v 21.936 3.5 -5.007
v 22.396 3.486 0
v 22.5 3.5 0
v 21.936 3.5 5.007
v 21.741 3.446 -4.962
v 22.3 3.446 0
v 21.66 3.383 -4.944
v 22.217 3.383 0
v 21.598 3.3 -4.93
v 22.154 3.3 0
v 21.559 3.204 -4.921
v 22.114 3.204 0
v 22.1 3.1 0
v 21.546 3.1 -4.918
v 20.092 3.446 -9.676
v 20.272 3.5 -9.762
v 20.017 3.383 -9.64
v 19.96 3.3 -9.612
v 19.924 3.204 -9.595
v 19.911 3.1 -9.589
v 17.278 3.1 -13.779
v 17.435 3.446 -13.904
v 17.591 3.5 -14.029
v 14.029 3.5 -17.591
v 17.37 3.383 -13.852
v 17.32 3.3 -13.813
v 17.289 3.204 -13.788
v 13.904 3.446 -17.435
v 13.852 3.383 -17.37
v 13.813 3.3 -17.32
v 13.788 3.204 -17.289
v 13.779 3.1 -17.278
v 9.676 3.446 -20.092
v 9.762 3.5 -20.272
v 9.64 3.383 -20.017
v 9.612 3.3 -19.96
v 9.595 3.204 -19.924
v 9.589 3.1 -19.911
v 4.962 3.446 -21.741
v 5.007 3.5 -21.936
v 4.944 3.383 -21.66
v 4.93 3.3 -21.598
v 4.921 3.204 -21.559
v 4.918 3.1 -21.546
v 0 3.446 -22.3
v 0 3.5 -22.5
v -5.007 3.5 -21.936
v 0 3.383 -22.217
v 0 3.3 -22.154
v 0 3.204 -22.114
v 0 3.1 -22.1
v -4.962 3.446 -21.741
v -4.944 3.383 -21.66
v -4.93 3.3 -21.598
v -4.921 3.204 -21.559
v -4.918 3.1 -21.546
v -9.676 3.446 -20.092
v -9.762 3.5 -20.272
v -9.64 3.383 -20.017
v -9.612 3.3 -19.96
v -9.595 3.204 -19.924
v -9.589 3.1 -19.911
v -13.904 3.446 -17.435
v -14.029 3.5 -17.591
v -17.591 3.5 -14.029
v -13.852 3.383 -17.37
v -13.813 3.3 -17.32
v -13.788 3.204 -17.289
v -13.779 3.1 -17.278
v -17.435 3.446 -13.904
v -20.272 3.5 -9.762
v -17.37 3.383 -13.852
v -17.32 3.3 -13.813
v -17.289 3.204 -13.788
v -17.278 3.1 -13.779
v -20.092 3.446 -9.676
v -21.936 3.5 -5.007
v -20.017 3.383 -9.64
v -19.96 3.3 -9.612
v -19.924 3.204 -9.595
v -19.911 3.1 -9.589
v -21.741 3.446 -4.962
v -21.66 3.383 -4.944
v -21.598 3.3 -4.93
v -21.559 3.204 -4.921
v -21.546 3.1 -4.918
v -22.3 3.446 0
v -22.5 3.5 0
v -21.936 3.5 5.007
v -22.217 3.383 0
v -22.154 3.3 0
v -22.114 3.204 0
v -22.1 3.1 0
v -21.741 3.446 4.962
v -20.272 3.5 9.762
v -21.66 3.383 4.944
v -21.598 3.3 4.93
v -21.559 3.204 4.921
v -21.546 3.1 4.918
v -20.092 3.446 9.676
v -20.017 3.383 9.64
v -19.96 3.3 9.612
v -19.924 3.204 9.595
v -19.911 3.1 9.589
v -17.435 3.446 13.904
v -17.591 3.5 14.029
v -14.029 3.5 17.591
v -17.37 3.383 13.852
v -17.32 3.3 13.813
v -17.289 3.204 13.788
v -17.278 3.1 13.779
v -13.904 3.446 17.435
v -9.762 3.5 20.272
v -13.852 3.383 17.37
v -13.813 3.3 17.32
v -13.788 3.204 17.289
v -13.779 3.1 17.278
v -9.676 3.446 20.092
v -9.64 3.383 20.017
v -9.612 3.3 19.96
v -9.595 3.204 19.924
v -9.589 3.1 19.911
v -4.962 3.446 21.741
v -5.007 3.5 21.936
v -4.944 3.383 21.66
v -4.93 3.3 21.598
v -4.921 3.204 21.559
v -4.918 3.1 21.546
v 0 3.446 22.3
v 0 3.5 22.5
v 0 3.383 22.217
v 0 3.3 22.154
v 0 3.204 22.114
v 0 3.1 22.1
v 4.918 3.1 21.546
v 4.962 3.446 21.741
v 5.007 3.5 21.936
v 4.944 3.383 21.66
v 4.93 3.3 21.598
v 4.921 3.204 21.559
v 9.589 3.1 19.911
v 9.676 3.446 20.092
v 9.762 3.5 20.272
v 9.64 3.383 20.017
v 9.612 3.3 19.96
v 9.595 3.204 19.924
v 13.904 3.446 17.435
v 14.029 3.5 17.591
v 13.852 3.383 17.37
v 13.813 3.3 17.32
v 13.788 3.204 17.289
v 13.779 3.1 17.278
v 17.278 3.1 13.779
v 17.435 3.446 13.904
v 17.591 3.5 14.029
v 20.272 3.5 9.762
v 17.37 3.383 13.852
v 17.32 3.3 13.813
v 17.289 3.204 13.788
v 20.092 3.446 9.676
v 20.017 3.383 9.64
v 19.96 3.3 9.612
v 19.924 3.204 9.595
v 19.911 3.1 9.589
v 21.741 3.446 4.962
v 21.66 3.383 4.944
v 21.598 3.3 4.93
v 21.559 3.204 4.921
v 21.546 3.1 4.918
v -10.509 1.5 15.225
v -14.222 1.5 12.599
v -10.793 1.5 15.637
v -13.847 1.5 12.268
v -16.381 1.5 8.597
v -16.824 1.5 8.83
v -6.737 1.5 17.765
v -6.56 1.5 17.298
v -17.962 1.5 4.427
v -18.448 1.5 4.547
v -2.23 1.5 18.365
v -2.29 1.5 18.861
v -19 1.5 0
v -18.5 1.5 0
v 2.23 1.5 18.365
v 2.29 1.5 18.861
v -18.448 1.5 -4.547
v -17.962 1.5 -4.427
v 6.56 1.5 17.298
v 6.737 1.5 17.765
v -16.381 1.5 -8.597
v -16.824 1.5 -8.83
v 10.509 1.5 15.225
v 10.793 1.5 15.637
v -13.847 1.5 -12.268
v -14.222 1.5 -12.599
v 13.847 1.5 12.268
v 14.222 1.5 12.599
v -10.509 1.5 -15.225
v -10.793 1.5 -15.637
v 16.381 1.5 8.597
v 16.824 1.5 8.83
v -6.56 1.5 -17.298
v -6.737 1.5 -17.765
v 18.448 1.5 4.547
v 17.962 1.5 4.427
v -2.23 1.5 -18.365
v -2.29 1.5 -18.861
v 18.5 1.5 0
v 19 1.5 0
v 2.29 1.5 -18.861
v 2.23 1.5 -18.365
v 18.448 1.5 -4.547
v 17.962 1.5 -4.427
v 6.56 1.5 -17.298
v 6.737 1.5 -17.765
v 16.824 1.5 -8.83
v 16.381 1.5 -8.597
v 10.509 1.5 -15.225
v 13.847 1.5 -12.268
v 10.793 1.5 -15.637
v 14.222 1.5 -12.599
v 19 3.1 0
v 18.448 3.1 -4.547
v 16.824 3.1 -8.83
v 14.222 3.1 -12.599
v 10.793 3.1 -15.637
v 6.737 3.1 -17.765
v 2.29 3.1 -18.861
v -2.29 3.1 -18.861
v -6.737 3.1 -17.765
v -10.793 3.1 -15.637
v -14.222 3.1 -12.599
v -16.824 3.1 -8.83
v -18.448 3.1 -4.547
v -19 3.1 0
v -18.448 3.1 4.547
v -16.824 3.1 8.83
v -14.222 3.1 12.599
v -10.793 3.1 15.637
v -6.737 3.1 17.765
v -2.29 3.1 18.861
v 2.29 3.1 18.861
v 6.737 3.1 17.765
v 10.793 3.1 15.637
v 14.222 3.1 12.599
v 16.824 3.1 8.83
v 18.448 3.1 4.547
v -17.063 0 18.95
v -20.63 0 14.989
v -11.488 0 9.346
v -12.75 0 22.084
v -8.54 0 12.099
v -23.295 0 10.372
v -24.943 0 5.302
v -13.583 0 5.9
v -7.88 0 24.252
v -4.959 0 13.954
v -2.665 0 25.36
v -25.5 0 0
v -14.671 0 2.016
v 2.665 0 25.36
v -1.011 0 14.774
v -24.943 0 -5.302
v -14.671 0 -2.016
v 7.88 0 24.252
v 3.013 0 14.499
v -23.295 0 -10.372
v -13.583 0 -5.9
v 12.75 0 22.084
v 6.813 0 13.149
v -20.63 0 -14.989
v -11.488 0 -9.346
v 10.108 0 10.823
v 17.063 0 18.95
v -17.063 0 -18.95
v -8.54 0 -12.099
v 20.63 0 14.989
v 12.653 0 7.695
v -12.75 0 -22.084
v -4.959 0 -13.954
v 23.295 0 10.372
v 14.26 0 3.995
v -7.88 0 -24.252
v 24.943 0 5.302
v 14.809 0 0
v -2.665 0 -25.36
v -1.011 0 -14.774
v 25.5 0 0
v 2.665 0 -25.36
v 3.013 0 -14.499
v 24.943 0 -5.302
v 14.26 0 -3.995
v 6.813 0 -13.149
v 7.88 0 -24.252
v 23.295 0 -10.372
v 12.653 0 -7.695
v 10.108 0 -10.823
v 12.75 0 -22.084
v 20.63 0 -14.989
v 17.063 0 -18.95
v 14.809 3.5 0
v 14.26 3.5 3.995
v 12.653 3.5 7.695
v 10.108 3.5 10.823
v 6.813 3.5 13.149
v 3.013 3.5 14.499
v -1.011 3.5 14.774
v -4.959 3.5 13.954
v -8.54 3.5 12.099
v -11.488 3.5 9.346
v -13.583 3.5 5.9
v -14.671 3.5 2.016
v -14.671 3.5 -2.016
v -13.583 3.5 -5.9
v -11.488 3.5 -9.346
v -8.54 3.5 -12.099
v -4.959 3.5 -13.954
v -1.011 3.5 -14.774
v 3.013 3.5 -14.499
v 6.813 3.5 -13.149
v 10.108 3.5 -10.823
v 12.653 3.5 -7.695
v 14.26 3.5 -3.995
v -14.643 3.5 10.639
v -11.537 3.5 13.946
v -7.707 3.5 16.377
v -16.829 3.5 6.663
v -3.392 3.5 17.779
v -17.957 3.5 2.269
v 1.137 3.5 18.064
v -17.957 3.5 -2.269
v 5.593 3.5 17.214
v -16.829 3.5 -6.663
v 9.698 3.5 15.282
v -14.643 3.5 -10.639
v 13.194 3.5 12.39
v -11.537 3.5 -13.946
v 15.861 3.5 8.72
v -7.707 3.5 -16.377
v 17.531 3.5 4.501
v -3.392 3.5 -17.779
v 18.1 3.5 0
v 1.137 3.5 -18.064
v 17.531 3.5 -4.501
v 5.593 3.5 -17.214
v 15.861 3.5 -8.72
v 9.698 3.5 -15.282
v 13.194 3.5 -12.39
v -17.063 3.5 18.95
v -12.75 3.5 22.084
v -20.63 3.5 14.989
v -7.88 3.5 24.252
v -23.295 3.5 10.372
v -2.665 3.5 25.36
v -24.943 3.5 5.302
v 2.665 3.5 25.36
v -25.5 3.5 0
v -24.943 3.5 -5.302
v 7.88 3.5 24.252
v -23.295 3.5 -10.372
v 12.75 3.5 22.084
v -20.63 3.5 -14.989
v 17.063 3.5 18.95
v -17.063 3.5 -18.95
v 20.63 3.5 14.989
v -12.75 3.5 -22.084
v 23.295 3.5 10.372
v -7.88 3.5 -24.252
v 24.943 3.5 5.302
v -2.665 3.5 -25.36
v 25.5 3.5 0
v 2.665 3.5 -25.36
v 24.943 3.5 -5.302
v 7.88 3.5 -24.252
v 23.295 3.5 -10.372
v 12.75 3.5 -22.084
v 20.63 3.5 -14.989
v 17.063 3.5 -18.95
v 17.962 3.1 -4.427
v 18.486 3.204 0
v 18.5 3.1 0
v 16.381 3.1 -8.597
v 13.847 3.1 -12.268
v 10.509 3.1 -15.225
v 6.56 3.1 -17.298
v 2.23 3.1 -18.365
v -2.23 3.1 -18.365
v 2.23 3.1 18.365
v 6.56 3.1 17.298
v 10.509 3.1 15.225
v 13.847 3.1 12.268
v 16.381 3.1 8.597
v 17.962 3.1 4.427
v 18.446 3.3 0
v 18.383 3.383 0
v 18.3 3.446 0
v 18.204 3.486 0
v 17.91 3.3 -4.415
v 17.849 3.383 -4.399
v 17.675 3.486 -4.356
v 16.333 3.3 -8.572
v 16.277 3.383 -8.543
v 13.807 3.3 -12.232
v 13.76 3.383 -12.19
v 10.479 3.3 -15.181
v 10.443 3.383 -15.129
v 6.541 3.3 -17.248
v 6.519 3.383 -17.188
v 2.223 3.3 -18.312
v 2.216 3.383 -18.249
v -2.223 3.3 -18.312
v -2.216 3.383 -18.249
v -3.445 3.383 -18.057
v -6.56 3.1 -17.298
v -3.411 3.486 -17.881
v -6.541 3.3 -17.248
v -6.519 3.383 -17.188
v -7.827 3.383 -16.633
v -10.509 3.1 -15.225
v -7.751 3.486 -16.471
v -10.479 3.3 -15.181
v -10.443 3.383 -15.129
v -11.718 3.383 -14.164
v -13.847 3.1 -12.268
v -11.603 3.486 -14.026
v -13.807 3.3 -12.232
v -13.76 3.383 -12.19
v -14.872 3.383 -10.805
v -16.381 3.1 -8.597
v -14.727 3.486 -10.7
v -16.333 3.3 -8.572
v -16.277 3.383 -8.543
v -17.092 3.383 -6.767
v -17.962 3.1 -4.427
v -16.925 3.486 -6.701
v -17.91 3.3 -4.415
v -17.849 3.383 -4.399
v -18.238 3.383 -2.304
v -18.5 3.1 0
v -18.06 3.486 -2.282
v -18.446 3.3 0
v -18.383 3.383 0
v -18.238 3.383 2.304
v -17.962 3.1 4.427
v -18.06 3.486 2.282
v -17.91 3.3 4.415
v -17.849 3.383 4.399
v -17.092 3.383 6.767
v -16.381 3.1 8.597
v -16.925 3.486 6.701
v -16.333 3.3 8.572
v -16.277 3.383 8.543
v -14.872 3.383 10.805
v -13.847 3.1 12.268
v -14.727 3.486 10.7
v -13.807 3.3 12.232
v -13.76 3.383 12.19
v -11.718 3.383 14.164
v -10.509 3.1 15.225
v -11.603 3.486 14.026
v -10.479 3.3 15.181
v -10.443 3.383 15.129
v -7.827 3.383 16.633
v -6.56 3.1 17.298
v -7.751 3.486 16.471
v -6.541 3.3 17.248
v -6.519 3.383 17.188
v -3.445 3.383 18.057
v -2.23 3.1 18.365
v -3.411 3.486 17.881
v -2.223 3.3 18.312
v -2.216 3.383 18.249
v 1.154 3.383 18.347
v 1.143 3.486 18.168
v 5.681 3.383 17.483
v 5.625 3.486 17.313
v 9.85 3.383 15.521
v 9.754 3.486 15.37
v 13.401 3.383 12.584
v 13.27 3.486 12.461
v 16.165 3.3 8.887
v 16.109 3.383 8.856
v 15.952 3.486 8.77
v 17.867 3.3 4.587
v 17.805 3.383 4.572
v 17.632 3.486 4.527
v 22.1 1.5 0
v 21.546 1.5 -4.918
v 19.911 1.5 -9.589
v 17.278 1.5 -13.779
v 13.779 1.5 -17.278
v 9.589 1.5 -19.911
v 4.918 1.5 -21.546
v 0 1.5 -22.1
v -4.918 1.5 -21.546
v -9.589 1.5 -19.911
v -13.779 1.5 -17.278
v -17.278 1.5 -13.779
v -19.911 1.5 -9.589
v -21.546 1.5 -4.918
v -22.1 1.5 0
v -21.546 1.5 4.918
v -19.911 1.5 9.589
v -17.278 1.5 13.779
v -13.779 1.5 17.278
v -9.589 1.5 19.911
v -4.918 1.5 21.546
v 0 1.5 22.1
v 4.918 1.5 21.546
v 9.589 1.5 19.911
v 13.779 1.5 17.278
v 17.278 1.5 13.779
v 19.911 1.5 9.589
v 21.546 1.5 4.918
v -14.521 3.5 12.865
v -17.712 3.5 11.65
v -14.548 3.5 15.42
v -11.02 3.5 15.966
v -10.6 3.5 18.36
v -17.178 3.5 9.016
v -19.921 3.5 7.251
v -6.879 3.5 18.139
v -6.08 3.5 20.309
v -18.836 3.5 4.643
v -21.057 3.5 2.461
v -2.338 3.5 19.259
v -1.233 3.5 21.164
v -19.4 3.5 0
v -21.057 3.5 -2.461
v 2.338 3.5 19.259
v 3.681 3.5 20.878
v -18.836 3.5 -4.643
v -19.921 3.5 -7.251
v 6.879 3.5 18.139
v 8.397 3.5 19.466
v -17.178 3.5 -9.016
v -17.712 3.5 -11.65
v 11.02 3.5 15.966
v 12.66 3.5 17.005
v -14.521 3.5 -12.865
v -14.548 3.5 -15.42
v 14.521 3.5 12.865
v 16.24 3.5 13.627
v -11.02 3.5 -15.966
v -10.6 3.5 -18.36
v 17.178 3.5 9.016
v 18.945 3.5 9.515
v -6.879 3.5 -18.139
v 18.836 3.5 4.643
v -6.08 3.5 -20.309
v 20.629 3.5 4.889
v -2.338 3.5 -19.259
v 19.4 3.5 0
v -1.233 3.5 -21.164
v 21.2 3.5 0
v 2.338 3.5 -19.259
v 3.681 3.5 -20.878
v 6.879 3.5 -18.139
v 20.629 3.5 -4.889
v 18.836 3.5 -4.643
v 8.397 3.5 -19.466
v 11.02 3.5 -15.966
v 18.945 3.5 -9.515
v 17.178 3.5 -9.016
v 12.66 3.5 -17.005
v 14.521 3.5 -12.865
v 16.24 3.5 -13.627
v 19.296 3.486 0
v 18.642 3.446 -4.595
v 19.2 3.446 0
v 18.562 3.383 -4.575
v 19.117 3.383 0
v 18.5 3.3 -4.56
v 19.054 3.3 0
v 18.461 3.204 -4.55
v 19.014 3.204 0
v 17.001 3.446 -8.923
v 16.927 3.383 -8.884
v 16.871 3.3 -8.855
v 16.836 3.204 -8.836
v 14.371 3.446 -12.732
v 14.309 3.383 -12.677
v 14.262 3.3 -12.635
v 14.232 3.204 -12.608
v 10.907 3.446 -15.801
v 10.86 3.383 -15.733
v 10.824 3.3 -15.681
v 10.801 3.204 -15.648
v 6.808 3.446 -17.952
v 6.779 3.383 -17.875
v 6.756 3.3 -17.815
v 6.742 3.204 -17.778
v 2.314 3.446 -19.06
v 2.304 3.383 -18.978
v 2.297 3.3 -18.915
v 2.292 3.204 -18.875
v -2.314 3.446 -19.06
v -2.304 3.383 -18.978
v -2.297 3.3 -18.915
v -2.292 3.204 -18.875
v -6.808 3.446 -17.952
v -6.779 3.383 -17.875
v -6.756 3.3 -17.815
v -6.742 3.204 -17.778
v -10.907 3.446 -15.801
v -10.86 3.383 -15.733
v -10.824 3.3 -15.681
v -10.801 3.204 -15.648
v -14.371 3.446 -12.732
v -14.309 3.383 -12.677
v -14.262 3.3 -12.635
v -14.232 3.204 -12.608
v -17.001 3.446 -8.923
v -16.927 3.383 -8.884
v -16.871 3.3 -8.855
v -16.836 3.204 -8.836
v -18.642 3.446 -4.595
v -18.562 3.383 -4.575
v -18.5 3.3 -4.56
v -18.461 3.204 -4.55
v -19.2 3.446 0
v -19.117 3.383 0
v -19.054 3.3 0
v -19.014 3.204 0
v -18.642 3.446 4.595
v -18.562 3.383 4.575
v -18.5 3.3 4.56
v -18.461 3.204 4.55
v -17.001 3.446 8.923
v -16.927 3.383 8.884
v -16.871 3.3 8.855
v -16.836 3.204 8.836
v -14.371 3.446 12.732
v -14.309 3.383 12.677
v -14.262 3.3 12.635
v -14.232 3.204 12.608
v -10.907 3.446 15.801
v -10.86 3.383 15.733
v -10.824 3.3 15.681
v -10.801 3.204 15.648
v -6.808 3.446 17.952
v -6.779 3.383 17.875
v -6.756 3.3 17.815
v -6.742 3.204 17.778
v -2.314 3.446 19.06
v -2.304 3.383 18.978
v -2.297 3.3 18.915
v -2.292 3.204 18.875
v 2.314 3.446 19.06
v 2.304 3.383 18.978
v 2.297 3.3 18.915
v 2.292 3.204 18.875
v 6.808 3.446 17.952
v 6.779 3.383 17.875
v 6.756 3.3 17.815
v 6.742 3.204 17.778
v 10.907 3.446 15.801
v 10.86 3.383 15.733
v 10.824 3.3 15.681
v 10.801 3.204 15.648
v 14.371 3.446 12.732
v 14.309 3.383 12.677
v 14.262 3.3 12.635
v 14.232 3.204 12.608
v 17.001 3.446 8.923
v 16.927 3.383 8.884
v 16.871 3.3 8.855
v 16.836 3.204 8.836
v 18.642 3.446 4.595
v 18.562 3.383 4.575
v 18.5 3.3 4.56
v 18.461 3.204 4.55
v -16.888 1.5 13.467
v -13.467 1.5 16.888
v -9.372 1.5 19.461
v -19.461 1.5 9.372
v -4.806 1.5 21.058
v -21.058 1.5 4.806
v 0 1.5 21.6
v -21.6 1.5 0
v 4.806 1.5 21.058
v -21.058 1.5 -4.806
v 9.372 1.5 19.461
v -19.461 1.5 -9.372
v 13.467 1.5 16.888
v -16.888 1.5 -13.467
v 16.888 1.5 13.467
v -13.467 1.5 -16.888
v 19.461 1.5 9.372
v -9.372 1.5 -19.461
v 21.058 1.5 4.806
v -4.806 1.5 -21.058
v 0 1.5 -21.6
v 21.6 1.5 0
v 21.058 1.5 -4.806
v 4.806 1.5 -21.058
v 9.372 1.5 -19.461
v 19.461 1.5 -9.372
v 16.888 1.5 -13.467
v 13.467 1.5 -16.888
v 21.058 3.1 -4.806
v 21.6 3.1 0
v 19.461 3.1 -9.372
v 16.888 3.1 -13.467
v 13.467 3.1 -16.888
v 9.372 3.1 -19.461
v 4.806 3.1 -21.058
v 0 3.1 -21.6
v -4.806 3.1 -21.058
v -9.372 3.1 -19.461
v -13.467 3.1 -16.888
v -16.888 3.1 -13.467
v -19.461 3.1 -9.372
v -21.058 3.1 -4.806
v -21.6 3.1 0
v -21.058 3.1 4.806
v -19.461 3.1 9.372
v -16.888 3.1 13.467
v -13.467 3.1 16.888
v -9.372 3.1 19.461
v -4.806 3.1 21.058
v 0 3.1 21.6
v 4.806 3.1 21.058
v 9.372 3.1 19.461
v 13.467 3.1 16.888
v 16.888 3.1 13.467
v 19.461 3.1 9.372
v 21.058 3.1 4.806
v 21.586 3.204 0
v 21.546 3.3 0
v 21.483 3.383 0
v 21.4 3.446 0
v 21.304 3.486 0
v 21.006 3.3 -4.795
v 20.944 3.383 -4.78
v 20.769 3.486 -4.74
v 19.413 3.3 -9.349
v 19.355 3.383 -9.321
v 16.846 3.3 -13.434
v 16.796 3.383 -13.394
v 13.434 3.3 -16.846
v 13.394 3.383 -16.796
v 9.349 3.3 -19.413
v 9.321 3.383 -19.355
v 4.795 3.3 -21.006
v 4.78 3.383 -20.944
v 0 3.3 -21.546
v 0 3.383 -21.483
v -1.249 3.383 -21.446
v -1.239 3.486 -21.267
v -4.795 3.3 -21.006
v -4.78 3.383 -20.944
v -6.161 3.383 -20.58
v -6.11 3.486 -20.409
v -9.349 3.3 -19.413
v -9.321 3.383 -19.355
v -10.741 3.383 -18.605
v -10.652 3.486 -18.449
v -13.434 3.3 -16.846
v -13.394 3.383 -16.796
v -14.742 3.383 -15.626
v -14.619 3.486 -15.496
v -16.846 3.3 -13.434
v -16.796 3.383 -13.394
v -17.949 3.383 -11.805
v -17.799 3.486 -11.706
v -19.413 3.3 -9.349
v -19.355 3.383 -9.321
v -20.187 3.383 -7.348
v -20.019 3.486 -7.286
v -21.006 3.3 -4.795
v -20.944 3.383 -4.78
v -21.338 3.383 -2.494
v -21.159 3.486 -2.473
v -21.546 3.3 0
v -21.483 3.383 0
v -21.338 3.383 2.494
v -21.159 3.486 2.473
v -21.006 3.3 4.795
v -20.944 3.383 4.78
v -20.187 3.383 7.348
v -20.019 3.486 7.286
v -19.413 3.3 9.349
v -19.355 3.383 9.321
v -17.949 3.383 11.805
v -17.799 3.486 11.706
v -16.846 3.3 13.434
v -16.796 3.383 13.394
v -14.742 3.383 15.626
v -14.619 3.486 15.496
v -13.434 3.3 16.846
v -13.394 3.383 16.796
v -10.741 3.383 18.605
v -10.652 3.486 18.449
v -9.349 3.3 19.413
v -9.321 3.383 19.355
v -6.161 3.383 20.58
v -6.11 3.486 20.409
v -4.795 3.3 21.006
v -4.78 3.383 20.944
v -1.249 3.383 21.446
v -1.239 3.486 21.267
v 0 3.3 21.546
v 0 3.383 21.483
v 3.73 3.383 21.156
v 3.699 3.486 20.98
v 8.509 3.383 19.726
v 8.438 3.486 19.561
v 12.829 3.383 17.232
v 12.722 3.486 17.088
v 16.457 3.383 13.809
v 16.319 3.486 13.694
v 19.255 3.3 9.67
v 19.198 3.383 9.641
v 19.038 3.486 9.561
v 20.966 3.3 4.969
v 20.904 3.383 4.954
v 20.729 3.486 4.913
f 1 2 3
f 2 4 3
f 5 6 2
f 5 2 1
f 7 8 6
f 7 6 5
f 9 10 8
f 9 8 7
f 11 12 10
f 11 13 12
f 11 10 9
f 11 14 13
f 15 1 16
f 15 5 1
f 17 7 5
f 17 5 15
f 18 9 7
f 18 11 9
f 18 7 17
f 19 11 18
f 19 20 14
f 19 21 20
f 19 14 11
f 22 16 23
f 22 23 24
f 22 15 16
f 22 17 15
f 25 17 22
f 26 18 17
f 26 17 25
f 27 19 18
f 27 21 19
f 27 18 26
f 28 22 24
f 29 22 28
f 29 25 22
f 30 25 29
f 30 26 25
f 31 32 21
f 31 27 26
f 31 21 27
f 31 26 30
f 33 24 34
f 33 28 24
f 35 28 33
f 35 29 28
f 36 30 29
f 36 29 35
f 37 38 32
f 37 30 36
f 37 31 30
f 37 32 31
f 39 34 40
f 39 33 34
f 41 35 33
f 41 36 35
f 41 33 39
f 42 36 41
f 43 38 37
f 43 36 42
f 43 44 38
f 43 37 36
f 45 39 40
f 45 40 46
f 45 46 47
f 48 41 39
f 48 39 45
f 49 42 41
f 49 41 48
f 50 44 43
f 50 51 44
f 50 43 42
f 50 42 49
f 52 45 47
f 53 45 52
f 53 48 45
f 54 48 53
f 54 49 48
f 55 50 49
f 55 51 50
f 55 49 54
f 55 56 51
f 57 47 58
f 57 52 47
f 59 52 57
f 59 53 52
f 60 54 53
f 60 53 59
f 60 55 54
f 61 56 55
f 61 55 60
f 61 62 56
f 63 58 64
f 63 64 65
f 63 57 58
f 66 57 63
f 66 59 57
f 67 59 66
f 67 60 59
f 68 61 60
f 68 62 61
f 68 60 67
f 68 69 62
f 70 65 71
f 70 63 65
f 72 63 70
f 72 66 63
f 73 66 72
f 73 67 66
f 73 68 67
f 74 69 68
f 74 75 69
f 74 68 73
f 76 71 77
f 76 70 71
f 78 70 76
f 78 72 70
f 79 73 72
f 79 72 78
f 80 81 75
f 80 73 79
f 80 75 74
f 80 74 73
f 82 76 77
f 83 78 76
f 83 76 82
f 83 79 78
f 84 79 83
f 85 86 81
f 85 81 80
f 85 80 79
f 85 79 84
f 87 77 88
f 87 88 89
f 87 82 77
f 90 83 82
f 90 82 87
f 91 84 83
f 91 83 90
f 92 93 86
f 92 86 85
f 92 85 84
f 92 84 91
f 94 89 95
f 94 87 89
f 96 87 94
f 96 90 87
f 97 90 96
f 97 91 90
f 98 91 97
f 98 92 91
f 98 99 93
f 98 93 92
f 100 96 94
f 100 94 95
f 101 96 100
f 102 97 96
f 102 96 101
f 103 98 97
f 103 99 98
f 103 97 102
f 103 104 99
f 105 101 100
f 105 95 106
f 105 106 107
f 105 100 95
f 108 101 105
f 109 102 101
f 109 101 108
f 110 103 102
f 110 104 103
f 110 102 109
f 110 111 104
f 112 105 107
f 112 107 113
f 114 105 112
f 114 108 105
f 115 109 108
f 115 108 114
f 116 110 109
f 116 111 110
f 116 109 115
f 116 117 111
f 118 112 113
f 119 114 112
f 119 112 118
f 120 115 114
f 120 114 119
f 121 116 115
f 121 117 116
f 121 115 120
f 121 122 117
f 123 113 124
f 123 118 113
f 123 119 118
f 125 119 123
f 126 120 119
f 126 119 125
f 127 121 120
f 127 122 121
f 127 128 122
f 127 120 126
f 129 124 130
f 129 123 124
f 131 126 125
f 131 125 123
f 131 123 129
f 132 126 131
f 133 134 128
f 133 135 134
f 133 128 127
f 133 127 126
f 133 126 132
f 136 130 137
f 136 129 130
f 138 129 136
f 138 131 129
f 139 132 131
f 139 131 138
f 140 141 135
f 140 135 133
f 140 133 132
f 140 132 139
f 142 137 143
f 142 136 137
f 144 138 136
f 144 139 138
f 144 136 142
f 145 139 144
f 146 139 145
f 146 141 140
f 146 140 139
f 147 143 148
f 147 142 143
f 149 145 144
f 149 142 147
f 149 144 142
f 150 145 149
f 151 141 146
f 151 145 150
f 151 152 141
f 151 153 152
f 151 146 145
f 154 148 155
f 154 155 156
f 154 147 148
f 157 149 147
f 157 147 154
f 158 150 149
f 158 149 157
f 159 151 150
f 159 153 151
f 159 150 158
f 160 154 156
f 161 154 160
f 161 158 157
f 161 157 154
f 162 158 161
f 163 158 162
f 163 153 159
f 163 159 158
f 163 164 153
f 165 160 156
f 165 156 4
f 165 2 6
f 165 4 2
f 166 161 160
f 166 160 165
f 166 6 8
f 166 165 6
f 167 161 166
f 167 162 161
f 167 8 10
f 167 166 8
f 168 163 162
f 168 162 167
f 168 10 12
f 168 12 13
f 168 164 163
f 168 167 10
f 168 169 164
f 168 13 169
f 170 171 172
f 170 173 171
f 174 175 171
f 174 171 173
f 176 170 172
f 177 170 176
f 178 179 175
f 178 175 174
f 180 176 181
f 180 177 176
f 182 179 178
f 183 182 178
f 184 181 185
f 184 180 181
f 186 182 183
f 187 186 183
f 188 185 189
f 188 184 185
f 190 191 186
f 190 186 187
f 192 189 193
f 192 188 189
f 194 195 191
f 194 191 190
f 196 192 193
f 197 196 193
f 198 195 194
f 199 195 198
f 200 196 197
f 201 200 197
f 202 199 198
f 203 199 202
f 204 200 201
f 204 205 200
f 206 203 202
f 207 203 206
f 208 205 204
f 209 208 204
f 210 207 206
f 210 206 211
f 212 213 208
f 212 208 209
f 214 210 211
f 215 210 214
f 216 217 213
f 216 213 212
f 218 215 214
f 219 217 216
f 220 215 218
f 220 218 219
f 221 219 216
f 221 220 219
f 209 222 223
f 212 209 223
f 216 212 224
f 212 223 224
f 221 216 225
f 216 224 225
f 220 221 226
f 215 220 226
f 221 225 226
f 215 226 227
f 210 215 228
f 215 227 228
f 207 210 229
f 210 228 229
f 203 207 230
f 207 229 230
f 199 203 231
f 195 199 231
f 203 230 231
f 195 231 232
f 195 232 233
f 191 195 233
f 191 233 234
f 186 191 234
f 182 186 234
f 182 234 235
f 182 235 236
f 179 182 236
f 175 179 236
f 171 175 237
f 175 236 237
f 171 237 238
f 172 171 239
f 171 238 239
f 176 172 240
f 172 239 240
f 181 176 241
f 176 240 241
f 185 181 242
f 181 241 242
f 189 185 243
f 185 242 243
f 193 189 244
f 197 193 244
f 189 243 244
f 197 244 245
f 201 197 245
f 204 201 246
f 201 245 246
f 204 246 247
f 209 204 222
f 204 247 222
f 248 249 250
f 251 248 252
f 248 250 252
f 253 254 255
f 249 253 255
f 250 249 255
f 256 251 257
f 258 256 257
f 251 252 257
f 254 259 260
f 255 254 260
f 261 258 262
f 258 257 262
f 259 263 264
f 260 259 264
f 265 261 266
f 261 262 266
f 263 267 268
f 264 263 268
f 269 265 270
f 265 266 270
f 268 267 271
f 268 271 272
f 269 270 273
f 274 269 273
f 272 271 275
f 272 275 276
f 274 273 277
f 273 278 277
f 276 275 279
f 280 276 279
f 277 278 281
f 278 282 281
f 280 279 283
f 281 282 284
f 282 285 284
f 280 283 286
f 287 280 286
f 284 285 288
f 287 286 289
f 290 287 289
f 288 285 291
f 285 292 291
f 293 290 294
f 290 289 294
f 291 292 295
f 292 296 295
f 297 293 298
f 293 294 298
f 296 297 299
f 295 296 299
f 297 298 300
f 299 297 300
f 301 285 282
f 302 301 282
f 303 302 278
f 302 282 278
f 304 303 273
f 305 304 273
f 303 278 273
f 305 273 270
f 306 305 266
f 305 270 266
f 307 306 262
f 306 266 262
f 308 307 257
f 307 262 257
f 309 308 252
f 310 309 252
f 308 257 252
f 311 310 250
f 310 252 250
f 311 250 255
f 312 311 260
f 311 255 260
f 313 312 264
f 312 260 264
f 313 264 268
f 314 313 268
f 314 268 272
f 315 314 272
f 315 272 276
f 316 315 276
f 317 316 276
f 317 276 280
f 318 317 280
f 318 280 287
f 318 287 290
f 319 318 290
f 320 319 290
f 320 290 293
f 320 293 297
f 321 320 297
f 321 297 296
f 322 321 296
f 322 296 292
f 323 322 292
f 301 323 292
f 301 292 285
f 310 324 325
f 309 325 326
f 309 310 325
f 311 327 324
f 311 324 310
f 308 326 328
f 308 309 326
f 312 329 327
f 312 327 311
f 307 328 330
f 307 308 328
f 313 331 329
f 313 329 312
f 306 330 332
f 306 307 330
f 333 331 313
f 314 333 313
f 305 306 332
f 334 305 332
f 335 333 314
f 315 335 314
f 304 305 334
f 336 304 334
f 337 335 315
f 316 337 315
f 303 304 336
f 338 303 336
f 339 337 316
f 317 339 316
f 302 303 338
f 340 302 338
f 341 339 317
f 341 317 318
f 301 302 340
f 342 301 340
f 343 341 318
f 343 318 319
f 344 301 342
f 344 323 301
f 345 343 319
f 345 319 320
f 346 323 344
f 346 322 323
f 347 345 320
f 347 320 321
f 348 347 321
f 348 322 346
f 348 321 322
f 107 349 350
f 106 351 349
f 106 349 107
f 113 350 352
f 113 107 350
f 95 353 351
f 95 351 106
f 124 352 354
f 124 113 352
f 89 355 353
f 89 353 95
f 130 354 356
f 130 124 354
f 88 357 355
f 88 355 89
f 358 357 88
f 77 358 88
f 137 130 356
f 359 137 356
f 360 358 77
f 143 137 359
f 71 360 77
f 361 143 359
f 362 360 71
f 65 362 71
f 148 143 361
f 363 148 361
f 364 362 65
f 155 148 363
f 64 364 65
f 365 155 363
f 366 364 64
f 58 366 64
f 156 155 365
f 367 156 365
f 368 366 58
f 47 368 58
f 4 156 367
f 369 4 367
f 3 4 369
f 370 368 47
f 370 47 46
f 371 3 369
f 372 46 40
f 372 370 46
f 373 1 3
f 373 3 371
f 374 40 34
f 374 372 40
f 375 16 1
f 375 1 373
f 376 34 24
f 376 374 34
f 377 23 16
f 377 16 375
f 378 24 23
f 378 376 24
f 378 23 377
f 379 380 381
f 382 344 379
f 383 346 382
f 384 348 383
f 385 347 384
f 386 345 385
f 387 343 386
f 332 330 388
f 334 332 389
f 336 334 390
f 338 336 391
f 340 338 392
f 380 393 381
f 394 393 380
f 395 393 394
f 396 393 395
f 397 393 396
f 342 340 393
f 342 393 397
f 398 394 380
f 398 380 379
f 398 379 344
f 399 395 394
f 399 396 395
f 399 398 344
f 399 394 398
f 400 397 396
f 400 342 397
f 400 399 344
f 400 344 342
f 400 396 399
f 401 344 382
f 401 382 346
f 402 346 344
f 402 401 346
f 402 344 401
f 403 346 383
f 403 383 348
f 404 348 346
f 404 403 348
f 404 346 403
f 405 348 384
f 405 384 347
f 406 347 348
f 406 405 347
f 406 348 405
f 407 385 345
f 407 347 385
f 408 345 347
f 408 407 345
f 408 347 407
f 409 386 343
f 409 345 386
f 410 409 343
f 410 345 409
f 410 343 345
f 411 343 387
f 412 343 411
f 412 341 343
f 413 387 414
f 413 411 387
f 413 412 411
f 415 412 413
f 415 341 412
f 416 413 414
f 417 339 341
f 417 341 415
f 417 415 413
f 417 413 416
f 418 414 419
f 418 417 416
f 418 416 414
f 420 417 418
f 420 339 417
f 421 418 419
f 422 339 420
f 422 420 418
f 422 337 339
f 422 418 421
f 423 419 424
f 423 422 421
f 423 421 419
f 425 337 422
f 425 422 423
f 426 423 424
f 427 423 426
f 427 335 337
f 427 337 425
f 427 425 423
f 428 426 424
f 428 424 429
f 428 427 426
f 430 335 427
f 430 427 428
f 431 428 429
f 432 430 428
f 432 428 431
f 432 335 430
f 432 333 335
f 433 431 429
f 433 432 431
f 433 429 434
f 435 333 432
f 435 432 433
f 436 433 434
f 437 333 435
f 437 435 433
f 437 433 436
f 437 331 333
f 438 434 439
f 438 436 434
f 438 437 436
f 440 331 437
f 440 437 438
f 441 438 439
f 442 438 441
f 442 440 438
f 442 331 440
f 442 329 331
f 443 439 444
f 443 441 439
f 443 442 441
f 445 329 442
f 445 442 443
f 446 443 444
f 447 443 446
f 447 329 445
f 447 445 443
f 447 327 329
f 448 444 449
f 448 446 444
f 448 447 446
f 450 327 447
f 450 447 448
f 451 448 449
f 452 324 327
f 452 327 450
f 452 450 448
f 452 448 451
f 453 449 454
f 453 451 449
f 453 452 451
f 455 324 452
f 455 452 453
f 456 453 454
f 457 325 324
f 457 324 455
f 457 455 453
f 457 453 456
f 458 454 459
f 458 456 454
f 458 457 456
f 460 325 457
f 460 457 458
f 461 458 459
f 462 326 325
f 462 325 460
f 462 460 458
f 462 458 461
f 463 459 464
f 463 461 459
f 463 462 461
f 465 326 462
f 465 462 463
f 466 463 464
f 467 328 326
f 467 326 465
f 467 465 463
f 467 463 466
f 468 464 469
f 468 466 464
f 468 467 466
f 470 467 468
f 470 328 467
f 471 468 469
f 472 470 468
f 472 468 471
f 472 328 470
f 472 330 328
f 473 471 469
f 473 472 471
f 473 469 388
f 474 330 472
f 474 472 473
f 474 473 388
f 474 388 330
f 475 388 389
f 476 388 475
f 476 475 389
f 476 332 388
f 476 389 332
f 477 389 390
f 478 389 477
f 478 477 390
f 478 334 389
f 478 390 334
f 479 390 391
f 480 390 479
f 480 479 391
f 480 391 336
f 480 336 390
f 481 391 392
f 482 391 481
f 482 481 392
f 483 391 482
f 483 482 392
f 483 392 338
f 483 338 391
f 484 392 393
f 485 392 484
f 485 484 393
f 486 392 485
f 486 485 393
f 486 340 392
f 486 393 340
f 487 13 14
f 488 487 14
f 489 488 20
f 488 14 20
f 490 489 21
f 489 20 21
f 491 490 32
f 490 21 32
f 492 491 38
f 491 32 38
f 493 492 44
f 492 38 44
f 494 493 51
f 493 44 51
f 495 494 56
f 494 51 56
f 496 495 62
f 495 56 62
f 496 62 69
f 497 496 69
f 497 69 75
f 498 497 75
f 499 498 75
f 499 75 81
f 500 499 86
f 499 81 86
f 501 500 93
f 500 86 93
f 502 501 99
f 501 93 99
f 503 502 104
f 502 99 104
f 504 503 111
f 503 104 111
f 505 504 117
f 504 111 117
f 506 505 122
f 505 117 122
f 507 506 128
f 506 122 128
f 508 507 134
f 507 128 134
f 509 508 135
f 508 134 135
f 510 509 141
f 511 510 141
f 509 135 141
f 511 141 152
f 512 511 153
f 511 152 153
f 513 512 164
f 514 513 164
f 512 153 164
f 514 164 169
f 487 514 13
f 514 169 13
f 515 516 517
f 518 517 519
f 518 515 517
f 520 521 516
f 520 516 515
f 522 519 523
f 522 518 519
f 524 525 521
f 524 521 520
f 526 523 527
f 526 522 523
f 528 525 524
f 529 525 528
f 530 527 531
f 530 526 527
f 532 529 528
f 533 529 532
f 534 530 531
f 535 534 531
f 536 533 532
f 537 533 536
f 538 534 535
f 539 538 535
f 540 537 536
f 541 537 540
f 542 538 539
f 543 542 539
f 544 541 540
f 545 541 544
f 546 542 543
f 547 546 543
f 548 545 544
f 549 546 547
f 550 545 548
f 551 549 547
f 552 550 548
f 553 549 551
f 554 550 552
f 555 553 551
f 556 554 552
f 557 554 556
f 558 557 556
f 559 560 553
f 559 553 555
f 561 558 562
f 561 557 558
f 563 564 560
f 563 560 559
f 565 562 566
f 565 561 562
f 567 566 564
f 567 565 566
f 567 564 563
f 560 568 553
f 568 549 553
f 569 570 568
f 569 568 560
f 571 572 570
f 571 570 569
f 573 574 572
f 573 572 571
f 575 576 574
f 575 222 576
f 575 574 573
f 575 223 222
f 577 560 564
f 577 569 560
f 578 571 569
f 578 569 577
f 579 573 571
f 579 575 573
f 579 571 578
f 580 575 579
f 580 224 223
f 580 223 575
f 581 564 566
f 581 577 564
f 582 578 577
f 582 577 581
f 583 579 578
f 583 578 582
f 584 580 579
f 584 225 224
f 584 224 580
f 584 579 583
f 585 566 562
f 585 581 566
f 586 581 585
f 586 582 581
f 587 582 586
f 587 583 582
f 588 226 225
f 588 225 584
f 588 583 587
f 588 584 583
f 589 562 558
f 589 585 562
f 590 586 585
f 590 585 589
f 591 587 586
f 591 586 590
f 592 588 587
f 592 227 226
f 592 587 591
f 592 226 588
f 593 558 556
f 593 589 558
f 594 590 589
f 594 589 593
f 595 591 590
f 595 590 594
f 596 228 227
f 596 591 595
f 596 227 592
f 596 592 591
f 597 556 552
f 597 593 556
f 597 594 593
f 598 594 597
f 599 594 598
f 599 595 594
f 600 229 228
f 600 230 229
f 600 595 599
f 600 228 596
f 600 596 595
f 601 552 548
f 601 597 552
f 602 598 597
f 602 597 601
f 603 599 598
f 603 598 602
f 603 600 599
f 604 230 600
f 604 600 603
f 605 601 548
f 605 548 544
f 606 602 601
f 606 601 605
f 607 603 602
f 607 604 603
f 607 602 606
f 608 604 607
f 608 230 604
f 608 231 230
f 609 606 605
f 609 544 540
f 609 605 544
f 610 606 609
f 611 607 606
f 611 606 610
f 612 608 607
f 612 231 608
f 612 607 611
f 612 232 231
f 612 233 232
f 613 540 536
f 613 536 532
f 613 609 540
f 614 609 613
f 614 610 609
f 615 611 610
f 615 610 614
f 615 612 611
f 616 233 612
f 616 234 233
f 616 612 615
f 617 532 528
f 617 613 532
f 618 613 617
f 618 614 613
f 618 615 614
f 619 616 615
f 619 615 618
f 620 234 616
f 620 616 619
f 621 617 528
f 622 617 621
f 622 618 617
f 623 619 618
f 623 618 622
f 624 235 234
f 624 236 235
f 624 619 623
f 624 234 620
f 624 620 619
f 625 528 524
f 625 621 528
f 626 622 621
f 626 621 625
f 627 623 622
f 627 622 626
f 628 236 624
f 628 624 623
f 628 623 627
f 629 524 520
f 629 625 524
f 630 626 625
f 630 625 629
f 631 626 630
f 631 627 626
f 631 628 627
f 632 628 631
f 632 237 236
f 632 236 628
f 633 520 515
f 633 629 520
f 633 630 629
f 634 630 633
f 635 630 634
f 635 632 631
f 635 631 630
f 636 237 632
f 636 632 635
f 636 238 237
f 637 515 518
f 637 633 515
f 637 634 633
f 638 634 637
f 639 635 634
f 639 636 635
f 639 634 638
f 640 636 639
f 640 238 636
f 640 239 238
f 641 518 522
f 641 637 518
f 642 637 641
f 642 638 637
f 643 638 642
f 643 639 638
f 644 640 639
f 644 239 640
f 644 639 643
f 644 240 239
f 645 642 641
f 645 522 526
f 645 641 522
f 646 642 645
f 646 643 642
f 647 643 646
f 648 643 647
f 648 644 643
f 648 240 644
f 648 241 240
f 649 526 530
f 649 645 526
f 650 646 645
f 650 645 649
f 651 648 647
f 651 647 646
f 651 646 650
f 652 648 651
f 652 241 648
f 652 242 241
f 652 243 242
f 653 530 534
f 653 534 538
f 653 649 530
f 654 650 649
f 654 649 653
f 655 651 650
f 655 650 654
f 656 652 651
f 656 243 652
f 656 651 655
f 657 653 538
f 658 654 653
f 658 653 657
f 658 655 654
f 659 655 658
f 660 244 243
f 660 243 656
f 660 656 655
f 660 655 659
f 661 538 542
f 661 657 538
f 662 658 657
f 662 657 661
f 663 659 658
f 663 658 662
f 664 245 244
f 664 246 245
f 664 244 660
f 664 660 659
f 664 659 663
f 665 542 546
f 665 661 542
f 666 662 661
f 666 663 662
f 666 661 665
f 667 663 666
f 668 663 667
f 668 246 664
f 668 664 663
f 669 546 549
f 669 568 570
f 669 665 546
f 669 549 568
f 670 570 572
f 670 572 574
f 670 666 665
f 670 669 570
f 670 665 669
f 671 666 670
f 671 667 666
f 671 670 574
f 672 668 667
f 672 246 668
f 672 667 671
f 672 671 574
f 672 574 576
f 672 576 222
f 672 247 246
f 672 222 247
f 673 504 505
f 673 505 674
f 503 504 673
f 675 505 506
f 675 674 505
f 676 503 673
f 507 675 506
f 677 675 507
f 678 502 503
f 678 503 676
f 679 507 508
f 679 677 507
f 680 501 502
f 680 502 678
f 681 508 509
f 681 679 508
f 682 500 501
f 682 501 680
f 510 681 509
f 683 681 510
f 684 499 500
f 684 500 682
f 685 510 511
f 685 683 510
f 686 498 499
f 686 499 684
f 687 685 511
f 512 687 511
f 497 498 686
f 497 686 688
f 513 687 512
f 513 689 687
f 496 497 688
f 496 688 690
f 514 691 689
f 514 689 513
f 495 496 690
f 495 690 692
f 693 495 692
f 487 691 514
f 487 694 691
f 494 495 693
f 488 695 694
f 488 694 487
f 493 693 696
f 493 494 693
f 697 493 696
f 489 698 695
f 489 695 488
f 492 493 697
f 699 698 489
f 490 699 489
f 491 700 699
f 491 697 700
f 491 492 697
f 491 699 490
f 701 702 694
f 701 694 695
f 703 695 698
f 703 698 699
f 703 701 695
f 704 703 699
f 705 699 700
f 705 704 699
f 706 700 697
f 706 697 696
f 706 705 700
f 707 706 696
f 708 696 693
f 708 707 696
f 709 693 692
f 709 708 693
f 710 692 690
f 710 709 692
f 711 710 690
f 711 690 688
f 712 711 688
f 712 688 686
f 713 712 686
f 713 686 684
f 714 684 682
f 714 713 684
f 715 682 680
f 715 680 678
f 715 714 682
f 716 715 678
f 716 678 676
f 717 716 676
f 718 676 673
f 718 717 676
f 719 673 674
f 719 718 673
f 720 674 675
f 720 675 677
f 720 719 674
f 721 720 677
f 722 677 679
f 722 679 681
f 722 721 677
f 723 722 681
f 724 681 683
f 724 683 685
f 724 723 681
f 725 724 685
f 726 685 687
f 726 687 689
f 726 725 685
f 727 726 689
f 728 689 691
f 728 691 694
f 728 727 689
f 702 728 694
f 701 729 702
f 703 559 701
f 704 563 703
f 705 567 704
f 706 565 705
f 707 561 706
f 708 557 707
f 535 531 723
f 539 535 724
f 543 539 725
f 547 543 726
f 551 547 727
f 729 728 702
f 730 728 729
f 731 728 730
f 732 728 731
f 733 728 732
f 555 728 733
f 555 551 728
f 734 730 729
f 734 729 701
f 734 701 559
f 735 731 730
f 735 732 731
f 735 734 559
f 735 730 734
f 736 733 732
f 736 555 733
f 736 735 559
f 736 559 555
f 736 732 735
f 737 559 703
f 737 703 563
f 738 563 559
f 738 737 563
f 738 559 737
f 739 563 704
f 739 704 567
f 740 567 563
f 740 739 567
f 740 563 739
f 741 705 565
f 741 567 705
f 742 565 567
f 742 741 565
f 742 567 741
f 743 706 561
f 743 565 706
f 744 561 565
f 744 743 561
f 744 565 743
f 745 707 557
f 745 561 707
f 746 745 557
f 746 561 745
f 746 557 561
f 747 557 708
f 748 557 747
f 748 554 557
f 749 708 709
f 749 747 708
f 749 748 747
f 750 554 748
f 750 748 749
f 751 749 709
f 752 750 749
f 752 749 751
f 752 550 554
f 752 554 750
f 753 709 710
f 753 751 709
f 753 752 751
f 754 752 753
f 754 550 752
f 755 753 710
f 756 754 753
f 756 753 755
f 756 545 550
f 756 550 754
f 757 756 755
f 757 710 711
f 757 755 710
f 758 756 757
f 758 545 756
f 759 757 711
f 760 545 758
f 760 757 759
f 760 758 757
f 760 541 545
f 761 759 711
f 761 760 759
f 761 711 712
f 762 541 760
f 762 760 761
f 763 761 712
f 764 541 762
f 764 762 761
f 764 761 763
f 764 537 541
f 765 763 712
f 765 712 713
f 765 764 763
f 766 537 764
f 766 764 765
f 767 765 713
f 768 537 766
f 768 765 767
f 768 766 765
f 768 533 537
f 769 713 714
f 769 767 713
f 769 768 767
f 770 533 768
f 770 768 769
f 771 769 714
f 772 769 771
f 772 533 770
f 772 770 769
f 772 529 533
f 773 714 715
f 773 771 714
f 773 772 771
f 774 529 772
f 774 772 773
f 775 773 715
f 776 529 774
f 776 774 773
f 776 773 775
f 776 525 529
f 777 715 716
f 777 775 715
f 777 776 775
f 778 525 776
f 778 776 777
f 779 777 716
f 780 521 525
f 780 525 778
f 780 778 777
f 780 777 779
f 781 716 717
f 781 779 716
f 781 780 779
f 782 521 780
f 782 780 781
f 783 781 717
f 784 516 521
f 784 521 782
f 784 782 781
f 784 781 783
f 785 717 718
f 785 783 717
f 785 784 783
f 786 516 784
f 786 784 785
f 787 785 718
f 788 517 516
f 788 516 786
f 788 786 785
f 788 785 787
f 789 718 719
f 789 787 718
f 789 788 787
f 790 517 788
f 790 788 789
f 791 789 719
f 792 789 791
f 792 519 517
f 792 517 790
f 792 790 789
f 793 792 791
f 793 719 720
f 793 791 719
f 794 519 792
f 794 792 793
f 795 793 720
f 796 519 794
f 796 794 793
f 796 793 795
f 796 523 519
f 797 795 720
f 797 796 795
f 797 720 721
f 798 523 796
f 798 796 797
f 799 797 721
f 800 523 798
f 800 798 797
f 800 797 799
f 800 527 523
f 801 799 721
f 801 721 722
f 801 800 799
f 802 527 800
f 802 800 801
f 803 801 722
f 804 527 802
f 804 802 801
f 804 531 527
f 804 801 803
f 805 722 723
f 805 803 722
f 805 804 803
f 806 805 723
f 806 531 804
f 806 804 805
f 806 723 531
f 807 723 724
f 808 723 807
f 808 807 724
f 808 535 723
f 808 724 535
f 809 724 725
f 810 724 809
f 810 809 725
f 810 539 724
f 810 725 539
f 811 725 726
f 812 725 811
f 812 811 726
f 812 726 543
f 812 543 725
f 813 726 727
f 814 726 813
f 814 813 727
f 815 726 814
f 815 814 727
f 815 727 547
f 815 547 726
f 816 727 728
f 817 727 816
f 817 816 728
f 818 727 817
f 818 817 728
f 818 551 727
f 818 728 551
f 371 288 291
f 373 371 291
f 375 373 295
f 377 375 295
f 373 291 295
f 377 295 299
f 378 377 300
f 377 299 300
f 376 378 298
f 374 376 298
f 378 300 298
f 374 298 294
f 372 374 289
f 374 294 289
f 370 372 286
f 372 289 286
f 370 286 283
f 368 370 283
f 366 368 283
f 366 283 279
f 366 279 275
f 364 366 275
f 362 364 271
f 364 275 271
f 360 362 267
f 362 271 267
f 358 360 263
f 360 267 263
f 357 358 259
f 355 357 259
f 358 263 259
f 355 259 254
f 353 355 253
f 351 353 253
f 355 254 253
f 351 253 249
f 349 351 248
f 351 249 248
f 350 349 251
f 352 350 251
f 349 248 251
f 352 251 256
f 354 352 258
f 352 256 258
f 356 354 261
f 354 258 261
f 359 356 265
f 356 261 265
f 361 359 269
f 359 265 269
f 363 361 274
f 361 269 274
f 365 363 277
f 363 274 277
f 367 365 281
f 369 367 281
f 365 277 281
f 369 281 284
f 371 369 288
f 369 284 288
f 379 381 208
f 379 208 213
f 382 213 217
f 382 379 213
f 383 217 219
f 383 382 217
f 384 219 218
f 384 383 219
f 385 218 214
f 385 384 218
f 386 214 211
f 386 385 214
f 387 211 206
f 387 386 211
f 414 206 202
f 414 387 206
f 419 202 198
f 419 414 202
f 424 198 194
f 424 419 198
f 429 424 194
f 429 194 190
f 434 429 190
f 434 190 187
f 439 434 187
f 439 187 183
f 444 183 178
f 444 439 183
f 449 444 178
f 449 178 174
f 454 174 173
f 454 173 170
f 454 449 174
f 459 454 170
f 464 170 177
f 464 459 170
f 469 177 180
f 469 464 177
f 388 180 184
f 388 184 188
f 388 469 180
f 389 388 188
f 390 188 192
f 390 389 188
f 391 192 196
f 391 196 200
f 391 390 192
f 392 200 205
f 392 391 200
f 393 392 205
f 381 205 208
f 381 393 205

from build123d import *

# Parameters (mm, degrees)
SKETCH_1_R          = 25.5
EXTRUDE_1_DEPTH     = 3.5
SKETCH_2_R          = 19
SKETCH_2_R_2        = 18.5
CUT_EXTRUDE_1_DEPTH = 2
SKETCH_3_R          = 22.1
SKETCH_3_R_2        = 21.6
CUT_EXTRUDE_2_DEPTH = 2
FILLET_1_R          = 0.4
SKETCH_4_R          = 14.809002025
CUT_EXTRUDE_3_DEPTH = 10


with BuildPart() as part:
    # 草图1 → 凸台-拉伸1 (new body)
    with BuildSketch(Plane(origin=(0, 0, 0), x_dir=(1, 0, 0), z_dir=(0, 1, 0))):
        Circle(SKETCH_1_R)
    extrude(amount=EXTRUDE_1_DEPTH)

    # 草图2 → 切除-拉伸1 (cut)
    with BuildSketch(Plane(origin=(0, 3.5, 0), x_dir=(1, 0, 0), z_dir=(0, 1, 0))):
        Circle(SKETCH_2_R)
        Circle(SKETCH_2_R_2, mode=Mode.SUBTRACT)
    extrude(amount=-CUT_EXTRUDE_1_DEPTH, mode=Mode.SUBTRACT)

    # 草图3 → 切除-拉伸2 (cut)
    with BuildSketch(Plane(origin=(0, 3.5, 0), x_dir=(1, 0, 0), z_dir=(0, 1, 0))):
        Circle(SKETCH_3_R)
        Circle(SKETCH_3_R_2, mode=Mode.SUBTRACT)
    extrude(amount=-CUT_EXTRUDE_2_DEPTH, mode=Mode.SUBTRACT)

    # 圆角1
    fillet_1_edges = [part.edges().sort_by_distance(p)[0] for p in [
        (-22.1, 3.5, 0),
        (-21.6, 3.5, 0),
        (-19, 3.5, 0),
        (-18.5, 3.5, 0),
    ]]
    fillet(fillet_1_edges, radius=FILLET_1_R)

    # 草图4 → 切除-拉伸3 (cut)
    with BuildSketch(Plane.XZ):
        Circle(SKETCH_4_R)
    extrude(amount=-CUT_EXTRUDE_3_DEPTH, mode=Mode.SUBTRACT)


solid = part.part
